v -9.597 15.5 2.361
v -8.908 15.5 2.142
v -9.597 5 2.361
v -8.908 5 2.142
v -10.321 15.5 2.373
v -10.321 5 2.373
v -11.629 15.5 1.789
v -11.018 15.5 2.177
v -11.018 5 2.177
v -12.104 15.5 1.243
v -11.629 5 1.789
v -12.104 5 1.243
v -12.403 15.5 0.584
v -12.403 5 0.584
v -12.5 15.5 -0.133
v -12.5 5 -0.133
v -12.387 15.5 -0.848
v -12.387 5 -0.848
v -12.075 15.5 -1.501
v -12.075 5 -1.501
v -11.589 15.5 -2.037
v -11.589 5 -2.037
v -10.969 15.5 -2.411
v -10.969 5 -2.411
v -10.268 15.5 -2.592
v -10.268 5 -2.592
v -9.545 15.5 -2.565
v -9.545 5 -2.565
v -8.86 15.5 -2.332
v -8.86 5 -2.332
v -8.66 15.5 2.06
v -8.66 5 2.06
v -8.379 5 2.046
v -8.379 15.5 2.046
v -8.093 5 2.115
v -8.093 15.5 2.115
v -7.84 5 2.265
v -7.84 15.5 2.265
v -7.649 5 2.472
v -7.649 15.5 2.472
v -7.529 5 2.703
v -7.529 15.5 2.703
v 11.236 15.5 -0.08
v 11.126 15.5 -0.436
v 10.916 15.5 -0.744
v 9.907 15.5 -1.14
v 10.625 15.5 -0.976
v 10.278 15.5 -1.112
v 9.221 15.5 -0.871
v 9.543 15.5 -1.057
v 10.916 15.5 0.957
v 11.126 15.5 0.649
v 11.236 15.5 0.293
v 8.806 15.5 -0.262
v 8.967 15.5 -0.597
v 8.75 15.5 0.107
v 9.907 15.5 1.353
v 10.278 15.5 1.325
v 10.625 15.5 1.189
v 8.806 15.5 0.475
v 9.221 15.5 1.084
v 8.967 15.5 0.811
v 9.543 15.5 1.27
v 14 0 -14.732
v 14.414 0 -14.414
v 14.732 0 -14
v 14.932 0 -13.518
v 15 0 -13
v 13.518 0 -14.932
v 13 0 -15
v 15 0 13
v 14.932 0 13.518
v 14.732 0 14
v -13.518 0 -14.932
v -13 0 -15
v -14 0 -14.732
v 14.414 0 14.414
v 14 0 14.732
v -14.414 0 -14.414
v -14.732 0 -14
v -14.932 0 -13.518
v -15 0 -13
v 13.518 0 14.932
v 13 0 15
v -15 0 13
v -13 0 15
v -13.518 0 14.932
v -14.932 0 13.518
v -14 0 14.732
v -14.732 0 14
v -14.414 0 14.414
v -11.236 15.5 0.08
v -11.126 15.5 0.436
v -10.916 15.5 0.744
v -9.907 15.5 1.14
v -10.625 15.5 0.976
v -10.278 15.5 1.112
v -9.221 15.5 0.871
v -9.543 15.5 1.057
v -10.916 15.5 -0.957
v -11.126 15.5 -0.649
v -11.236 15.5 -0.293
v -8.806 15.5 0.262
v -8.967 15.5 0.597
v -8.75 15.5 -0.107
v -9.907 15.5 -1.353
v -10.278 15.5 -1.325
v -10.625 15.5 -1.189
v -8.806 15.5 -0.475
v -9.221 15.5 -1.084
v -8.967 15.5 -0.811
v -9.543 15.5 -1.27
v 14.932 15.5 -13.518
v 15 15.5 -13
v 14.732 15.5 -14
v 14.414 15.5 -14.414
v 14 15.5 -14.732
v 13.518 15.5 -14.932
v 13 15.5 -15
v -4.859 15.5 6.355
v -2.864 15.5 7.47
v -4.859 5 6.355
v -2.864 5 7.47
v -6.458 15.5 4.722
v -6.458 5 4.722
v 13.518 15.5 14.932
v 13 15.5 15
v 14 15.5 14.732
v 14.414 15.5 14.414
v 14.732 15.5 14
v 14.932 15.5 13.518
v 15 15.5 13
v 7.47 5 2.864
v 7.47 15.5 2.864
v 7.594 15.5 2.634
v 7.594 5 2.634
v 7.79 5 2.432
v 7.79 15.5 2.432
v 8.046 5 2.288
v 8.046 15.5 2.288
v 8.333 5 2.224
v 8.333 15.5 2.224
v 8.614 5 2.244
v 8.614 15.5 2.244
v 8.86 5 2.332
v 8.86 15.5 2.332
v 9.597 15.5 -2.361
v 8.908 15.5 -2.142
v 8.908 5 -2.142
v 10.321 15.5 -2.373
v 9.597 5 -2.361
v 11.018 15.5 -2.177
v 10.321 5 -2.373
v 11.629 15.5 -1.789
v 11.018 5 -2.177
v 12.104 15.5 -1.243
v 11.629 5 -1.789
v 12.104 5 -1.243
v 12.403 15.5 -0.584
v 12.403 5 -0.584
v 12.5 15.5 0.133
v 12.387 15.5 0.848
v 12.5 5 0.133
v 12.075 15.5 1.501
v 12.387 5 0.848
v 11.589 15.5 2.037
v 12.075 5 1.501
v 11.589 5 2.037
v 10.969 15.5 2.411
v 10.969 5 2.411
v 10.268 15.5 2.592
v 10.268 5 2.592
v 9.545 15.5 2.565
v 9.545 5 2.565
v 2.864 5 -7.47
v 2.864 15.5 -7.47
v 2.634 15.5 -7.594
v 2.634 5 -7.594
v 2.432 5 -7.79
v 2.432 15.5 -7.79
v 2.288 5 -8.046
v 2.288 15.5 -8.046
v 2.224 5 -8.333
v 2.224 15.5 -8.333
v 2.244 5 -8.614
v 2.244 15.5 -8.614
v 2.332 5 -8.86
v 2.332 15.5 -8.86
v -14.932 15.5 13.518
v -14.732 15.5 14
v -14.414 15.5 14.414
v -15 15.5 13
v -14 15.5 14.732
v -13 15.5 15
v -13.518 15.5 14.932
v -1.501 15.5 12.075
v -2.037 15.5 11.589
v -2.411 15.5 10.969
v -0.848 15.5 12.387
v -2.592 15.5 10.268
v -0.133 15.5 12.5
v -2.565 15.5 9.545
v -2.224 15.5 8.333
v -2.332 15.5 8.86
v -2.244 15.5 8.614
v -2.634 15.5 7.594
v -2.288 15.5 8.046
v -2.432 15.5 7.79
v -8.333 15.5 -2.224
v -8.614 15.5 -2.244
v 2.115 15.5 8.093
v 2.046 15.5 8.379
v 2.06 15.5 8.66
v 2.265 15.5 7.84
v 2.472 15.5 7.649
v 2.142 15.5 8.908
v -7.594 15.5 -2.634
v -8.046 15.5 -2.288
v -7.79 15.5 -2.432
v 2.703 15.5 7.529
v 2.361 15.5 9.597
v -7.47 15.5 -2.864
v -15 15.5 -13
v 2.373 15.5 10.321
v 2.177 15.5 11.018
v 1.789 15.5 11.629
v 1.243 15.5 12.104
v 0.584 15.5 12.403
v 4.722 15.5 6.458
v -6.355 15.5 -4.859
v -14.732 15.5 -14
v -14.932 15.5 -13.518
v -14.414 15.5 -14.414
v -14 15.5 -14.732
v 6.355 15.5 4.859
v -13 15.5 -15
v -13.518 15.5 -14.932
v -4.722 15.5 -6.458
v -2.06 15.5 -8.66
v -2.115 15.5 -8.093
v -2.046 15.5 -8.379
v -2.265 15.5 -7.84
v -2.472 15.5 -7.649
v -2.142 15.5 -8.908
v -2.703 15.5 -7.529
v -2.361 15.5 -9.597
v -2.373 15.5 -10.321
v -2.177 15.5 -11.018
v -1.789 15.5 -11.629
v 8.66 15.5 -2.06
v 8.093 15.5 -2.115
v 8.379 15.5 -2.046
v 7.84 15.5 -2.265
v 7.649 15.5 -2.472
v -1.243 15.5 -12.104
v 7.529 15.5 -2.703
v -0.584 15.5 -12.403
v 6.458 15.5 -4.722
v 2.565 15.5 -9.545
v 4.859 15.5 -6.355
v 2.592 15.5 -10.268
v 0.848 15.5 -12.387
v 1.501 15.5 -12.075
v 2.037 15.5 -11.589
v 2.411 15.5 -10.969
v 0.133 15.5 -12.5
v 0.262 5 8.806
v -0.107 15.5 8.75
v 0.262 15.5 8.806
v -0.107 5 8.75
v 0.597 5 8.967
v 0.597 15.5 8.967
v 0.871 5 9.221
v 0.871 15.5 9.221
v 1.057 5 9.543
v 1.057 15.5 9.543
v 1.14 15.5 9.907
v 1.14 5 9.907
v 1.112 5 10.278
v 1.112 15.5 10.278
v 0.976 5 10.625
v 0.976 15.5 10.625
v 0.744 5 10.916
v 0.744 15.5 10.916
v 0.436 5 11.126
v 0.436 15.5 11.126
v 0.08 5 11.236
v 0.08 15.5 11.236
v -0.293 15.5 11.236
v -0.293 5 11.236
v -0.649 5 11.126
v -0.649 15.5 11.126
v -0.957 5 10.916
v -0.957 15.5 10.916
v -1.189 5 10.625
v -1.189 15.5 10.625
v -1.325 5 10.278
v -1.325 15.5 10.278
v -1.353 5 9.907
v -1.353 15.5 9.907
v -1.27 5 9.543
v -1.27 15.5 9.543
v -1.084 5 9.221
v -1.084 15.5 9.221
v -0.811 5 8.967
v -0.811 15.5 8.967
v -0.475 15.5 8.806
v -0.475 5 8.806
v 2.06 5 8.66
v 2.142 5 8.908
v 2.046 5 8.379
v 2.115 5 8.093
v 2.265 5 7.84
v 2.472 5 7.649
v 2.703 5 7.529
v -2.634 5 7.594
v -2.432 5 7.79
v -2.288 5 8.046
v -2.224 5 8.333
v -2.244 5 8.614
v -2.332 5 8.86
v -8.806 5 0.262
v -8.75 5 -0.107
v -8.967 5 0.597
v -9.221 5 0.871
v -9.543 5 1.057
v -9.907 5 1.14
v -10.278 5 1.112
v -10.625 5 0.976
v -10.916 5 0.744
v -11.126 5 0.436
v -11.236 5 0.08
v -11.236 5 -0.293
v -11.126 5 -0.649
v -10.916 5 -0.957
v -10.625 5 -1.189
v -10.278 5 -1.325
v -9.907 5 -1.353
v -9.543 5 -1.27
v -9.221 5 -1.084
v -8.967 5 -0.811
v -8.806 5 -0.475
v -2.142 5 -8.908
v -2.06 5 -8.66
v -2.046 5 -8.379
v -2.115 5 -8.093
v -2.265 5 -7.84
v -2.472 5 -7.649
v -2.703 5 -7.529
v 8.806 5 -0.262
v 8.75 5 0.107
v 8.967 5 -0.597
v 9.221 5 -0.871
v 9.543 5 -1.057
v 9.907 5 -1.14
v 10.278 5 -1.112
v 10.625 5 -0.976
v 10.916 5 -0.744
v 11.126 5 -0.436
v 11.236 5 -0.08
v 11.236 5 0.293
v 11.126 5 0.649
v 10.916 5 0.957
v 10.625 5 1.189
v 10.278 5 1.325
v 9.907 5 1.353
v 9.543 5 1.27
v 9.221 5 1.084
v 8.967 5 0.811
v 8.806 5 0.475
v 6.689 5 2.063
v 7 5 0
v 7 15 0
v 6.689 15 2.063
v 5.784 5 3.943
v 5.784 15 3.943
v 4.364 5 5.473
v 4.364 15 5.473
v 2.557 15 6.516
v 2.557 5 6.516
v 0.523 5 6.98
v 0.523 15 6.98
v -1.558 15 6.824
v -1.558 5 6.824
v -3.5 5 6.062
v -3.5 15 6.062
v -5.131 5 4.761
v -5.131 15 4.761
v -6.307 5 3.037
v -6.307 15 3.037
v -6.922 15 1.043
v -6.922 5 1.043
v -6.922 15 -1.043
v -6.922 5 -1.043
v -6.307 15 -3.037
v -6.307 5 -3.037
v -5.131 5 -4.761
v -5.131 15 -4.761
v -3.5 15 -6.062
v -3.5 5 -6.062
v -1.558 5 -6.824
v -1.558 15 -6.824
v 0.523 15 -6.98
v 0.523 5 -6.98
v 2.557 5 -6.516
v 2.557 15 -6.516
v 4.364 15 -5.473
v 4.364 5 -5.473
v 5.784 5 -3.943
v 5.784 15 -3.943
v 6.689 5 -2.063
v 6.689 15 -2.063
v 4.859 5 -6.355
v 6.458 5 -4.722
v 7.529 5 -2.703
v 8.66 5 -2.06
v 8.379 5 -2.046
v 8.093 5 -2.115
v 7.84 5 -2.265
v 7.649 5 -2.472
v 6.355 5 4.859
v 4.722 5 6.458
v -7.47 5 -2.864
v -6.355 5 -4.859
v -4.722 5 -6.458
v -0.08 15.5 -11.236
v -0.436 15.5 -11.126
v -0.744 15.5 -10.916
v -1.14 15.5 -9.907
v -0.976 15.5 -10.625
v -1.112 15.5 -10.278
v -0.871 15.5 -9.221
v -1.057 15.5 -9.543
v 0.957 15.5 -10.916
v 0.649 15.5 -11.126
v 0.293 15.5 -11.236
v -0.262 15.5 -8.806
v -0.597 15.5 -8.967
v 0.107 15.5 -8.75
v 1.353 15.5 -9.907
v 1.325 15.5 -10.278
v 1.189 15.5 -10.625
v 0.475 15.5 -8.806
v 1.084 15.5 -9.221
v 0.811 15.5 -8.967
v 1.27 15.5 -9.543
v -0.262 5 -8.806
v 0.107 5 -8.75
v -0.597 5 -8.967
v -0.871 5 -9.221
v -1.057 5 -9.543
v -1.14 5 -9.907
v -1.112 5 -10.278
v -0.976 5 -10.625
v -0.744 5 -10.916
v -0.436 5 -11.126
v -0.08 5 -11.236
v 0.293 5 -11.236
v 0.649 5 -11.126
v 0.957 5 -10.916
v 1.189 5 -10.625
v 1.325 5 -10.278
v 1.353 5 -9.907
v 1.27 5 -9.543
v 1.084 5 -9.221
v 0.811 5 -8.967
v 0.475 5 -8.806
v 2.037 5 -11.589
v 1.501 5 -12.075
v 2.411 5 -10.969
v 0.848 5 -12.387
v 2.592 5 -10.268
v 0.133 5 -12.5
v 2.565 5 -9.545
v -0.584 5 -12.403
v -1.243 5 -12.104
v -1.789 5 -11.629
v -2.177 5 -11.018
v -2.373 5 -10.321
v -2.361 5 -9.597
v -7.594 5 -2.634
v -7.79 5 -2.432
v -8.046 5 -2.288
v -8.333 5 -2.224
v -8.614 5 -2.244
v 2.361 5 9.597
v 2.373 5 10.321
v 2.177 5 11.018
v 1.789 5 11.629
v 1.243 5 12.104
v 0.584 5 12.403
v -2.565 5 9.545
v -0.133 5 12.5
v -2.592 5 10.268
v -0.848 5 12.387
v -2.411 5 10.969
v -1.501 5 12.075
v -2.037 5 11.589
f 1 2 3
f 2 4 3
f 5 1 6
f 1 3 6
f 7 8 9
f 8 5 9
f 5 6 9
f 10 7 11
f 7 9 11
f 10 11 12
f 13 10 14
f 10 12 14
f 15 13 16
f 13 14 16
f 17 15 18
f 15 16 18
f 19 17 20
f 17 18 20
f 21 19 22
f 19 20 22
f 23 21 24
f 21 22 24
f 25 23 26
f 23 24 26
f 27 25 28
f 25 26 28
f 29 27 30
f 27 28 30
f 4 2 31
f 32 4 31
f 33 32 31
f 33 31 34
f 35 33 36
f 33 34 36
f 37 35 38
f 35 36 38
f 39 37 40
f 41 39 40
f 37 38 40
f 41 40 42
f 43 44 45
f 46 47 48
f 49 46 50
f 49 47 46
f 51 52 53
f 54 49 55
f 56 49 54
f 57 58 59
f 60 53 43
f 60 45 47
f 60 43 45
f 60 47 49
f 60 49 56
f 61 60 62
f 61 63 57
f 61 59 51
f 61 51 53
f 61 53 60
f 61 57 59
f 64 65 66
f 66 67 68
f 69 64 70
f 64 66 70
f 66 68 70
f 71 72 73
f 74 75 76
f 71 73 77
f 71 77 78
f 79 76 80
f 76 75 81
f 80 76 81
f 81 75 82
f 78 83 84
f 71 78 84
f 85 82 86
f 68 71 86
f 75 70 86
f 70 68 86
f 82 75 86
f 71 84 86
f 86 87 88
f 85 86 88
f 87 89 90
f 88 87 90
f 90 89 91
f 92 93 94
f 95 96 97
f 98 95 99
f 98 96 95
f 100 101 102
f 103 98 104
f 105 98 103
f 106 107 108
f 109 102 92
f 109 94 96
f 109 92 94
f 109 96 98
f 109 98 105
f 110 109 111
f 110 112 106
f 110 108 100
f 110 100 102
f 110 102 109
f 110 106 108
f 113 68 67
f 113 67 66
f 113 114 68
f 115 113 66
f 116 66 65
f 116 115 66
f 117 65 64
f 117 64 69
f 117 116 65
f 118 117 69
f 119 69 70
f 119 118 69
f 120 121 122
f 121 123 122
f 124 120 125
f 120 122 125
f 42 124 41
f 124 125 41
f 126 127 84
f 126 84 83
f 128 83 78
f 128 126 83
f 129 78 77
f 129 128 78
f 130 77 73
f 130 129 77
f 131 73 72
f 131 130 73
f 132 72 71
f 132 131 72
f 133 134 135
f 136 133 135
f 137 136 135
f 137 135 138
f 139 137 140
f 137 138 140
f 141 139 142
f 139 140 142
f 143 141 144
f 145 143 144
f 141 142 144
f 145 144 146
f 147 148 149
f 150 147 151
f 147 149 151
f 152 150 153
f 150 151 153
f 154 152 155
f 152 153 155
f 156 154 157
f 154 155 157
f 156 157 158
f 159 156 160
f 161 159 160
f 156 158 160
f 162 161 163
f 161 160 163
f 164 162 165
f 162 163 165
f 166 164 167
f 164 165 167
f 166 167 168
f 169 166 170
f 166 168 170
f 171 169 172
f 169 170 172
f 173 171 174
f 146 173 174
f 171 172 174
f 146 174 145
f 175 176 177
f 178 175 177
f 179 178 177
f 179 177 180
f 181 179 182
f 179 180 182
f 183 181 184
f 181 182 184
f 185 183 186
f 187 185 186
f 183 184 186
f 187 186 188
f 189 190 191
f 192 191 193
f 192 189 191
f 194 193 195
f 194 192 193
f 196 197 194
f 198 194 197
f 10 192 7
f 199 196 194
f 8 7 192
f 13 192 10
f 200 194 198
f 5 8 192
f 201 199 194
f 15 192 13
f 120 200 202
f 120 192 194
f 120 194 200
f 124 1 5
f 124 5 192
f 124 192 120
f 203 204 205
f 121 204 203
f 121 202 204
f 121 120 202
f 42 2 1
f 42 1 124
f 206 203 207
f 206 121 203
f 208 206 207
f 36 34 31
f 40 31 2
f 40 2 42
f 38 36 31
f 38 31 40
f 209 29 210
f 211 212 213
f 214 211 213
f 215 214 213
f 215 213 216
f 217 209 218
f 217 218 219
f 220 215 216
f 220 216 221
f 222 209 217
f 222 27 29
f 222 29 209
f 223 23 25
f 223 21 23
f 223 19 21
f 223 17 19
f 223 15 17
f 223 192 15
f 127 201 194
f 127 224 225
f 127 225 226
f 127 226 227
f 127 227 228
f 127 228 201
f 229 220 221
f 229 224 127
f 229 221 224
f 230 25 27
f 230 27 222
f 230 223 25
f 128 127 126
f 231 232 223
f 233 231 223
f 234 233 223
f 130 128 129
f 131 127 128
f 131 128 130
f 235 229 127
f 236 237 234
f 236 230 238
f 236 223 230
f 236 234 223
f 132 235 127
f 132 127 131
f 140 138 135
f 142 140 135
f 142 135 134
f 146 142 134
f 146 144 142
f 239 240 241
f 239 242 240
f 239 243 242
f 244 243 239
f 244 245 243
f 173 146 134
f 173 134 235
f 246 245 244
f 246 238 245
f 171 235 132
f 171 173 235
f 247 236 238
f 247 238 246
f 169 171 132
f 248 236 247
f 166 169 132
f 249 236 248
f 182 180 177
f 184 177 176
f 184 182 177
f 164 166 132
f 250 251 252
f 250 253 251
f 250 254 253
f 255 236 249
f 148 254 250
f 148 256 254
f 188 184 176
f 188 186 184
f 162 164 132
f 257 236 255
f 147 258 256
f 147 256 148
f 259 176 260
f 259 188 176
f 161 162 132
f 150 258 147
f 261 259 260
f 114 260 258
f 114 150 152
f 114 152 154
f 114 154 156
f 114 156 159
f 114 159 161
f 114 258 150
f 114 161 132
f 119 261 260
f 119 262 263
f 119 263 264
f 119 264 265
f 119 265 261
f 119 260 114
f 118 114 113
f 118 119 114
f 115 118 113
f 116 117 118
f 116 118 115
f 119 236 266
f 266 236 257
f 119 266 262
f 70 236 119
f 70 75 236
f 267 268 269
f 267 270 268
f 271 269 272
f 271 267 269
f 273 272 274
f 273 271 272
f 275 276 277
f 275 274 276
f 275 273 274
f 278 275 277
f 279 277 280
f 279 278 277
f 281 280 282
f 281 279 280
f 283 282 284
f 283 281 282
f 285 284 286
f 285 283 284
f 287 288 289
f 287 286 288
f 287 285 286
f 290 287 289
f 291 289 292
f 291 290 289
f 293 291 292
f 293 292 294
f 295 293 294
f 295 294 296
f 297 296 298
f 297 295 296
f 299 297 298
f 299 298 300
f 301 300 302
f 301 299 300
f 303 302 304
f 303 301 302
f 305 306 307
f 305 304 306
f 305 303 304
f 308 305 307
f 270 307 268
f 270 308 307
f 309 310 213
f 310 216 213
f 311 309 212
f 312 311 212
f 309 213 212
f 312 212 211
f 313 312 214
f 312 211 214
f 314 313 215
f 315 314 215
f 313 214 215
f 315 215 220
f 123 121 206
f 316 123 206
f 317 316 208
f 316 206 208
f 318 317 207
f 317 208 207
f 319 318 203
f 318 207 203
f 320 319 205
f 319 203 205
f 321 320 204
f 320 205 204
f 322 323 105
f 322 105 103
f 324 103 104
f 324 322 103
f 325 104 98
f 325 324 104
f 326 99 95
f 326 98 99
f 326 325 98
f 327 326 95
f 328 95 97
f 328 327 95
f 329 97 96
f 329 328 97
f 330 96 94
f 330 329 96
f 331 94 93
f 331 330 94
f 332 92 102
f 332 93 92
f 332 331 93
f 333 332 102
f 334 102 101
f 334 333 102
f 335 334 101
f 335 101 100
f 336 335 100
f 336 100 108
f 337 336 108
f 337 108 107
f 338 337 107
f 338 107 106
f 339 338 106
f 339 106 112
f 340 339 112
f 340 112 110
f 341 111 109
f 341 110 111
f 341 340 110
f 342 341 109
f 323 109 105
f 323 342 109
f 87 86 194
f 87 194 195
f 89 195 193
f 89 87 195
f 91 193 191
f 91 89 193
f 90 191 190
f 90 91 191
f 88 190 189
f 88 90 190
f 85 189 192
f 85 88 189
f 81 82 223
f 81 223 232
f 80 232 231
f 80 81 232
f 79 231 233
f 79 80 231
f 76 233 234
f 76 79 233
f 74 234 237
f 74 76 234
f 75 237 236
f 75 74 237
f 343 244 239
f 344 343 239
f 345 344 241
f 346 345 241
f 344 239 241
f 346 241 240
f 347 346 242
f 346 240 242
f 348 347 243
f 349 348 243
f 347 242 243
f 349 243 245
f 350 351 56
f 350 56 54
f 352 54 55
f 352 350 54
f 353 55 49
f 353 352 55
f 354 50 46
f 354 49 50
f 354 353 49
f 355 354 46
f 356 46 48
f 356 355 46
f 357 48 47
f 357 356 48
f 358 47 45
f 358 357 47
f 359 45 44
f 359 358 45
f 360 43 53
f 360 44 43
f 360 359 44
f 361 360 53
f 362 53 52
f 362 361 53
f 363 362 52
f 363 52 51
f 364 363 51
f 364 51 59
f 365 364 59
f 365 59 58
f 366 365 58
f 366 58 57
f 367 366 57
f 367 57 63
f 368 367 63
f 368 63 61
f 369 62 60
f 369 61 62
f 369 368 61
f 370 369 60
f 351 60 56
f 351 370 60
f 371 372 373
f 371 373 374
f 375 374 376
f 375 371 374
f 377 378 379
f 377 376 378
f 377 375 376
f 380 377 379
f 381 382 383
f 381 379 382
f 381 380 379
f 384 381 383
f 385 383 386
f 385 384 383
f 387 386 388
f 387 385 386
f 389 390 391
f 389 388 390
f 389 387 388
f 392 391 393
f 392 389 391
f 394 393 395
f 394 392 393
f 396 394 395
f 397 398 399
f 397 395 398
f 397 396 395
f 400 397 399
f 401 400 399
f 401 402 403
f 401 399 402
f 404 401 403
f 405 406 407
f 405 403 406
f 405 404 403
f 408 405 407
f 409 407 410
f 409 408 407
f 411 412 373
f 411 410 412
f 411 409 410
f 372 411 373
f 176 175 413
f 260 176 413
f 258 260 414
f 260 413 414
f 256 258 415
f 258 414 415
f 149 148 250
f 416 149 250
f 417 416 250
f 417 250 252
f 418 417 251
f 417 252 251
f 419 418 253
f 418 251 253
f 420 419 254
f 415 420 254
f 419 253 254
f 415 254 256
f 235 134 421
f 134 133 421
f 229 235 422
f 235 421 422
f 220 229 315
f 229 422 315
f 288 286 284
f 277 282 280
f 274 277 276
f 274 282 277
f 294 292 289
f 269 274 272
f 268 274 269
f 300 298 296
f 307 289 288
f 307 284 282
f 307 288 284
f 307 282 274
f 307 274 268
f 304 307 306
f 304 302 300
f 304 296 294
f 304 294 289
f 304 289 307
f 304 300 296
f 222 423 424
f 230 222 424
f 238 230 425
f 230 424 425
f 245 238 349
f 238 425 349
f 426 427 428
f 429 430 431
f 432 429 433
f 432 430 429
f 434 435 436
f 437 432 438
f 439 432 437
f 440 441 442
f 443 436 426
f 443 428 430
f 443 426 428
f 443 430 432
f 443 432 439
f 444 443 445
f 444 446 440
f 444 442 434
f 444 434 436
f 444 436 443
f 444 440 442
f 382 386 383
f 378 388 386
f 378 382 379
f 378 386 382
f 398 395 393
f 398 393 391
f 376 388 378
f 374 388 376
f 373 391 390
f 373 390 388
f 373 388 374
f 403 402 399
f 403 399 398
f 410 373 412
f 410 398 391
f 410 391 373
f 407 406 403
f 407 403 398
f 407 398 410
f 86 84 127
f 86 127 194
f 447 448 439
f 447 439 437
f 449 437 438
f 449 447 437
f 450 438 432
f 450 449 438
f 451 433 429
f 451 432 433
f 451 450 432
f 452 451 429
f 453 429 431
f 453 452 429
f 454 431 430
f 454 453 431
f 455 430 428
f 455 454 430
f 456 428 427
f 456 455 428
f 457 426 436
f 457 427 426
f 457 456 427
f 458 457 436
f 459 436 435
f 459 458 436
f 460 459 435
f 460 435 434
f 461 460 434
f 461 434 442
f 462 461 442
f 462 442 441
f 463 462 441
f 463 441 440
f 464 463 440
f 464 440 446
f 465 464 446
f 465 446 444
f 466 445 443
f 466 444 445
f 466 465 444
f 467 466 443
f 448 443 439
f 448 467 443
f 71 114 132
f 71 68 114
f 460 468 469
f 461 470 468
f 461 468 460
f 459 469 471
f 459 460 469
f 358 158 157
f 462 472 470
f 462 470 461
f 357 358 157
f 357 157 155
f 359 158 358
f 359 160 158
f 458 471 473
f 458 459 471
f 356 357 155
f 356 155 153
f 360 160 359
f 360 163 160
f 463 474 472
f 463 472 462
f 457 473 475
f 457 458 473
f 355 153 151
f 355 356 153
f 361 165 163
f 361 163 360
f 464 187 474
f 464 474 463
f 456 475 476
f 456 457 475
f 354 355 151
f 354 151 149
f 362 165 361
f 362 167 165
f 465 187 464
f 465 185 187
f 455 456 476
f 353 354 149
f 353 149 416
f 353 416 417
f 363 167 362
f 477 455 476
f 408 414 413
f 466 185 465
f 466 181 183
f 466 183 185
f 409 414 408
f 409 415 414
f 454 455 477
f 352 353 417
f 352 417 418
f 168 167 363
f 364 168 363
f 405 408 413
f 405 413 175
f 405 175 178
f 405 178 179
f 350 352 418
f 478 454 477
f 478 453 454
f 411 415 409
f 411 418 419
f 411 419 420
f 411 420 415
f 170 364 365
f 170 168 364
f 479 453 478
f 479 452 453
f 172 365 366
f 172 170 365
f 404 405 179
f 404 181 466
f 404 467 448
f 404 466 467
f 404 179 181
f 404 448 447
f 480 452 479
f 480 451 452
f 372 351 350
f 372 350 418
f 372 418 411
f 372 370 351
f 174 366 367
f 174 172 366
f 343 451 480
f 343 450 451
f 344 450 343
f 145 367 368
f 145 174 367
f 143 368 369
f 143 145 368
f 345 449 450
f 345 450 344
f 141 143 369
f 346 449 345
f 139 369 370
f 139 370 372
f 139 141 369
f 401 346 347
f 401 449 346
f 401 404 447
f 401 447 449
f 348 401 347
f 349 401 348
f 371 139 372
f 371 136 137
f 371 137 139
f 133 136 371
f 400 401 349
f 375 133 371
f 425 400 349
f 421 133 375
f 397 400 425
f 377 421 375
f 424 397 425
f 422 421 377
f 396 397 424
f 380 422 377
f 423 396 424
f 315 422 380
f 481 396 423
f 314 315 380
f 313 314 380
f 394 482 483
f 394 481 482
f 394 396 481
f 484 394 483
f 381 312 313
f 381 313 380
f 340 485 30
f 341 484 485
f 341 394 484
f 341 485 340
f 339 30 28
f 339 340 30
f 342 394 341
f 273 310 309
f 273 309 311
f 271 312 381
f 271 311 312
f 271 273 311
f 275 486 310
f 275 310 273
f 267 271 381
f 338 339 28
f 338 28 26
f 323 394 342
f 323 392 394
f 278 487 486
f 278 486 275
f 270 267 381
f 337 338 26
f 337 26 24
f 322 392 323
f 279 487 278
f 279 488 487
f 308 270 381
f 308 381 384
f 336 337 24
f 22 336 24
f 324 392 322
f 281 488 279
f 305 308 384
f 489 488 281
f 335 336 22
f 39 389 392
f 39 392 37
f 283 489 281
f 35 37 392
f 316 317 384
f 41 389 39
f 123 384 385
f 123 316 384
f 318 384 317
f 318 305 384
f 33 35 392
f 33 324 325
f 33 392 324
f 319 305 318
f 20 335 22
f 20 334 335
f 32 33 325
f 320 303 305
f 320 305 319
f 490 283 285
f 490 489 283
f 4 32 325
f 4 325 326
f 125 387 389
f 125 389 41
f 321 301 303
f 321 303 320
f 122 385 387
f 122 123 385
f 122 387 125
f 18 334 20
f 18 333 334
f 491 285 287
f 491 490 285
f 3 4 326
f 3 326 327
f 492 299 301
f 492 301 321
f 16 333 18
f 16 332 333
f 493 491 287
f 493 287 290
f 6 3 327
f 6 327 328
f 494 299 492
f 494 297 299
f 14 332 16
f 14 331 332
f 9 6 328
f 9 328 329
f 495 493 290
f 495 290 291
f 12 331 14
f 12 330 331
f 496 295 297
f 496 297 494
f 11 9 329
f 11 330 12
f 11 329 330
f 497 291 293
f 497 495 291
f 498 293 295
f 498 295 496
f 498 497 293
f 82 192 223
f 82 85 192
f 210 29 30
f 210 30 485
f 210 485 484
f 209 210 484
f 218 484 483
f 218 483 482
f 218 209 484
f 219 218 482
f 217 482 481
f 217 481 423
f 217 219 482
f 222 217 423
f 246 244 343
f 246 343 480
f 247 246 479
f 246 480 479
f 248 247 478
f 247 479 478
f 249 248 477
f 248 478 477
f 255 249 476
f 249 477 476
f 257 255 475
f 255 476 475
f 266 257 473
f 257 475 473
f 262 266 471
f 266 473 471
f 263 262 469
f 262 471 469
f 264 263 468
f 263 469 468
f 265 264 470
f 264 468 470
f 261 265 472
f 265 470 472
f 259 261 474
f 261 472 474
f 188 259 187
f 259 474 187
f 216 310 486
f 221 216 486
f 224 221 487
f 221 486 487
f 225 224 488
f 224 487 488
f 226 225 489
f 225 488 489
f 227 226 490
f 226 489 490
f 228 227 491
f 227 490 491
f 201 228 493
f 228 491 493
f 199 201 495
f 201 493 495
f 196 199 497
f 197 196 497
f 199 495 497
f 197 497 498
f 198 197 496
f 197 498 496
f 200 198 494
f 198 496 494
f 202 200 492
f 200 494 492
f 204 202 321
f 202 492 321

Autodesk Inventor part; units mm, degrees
ref_plane "YZ Plane" through (0, 0, 0) normal (1, 0, 0) x (0, 1, 0)
ref_plane "XZ Plane" through (0, 0, 0) normal (0, 1, 0) x (-1, 0, 0)
ref_plane "XY Plane" through (0, 0, 0) normal (0, 0, 1) x (1, 0, 0)
sketch "Sketch1" plane through (0, 0, 0) normal (0, 1, 0) x (-1, 0, 0)
  line L0 (-15, 15) -> (15, 15)
  line L1 (15, 15) -> (15, -15)
  line L2 (15, -15) -> (-15, -15)
  line L3 (-15, -15) -> (-15, 15)
  line L4 (-15, 15) -> (15, -15) construction
  line L5 (15, 15) -> (-15, -15) construction
  point P0 (0, 0)
  dimension "d0" = 30
  dimension "d1" = 30
extrude "Extrusion1" add sketch "Sketch1" along normal blind 5
sketch "Sketch2" plane through (0, 5, 0) normal (0, 1, 0) x (1, 0, 0)
  circle A0 centre (0, 0) radius 7
  dimension "d4" = 14
extrude "Extrusion2" add sketch "Sketch2" along normal blind 10
sketch "Sketch3" plane through (0, 5, 0) normal (0, 1, 0) x (1, 0, 0)
  line L0 (-15, -15) -> (15, -15) projected
  line L1 (0, -15) -> (0, 15) construction
  line L2 (15, 15) -> (-15, 15) projected
  line L3 (0, 0.1067) -> (-10, 0.1067) construction
  circle A0 centre (-10, 0.1067) radius 1.25
  point P0 (0, 0)
  point P1 (0, 0)
  dimension "d7" = 2.5
  dimension "d8" = 10
extrude "Extrusion3" add sketch "Sketch3" along normal blind 10.5
pattern_circular "Circular Pattern1" count 4 over 360 about axis through (0, 5, 0) along (0, 1, 0) of "Extrusion3"
sketch "Sketch4" plane through (0, 5, 0) normal (0, 1, 0) x (1, 0, 0)
  circle A0 centre (-10, 0.1067) radius 1.25 projected
  circle A1 centre (-10, 0.1067) radius 2.5
  circle A2 centre (0.1067, 10) radius 1.25 projected
  circle A3 centre (0.1067, 10) radius 2.5
  circle A4 centre (-0.1067, -10) radius 1.25 projected
  circle A5 centre (-0.1067, -10) radius 2.5
  circle A6 centre (10, -0.1067) radius 1.25 projected
  circle A7 centre (10, -0.1067) radius 2.5
  circle A8 centre (0, 0) radius 7 projected
  circle A9 centre (0, 0) radius 8
  line L0 (15, -15) -> (-15, -15)
  line L1 (-15, -15) -> (-15, 15)
  line L2 (-15, 15) -> (15, 15)
  line L3 (15, 15) -> (15, -15)
  line L4 (15, -15) -> (-15, 15) construction
  line L5 (-15, -15) -> (15, 15) construction
  point P0 (7.8729, -1.4203)
  point P1 (1.2519, -7.9014)
  point P2 (-1.4203, -7.8729)
  point P3 (-7.9014, -1.2519)
  point P4 (-7.8729, 1.4203)
  point P5 (-1.2519, 7.9014)
  point P6 (1.4203, 7.8729)
  point P7 (7.9014, 1.2519)
  dimension "d14" = 5
  dimension "d15" = 5
  dimension "d16" = 5
  dimension "d17" = 5
  dimension "d18" = 16
extrude "Extrusion4" add sketch "Sketch4" along normal up to surface (10.5 mm away) contours L0 L1 L2 L3
fillet "Fillet1" radius 1 8 edges at (-1.2519, 10.25, -7.9014) (-7.8729, 10.25, -1.4203) (-7.9014, 10.25, 1.2519) (-1.4203, 10.25, 7.8729) (1.2519, 10.25, 7.9014) (7.8729, 10.25, 1.4203) (7.9014, 10.25, -1.2519) (1.4203, 10.25, -7.8729)
fillet "Fillet2" radius 2 4 edges at (15, 7.75, 15) (15, 7.75, -15) (-15, 7.75, 15) (-15, 7.75, -15)
equation "\"d1\" = d0"
equation "\"d15\" = d14"
equation "\"d16\" = d14"
equation "\"d17\" = d14"
properties part number "PDMS stretcher mould A (x4) V2"
